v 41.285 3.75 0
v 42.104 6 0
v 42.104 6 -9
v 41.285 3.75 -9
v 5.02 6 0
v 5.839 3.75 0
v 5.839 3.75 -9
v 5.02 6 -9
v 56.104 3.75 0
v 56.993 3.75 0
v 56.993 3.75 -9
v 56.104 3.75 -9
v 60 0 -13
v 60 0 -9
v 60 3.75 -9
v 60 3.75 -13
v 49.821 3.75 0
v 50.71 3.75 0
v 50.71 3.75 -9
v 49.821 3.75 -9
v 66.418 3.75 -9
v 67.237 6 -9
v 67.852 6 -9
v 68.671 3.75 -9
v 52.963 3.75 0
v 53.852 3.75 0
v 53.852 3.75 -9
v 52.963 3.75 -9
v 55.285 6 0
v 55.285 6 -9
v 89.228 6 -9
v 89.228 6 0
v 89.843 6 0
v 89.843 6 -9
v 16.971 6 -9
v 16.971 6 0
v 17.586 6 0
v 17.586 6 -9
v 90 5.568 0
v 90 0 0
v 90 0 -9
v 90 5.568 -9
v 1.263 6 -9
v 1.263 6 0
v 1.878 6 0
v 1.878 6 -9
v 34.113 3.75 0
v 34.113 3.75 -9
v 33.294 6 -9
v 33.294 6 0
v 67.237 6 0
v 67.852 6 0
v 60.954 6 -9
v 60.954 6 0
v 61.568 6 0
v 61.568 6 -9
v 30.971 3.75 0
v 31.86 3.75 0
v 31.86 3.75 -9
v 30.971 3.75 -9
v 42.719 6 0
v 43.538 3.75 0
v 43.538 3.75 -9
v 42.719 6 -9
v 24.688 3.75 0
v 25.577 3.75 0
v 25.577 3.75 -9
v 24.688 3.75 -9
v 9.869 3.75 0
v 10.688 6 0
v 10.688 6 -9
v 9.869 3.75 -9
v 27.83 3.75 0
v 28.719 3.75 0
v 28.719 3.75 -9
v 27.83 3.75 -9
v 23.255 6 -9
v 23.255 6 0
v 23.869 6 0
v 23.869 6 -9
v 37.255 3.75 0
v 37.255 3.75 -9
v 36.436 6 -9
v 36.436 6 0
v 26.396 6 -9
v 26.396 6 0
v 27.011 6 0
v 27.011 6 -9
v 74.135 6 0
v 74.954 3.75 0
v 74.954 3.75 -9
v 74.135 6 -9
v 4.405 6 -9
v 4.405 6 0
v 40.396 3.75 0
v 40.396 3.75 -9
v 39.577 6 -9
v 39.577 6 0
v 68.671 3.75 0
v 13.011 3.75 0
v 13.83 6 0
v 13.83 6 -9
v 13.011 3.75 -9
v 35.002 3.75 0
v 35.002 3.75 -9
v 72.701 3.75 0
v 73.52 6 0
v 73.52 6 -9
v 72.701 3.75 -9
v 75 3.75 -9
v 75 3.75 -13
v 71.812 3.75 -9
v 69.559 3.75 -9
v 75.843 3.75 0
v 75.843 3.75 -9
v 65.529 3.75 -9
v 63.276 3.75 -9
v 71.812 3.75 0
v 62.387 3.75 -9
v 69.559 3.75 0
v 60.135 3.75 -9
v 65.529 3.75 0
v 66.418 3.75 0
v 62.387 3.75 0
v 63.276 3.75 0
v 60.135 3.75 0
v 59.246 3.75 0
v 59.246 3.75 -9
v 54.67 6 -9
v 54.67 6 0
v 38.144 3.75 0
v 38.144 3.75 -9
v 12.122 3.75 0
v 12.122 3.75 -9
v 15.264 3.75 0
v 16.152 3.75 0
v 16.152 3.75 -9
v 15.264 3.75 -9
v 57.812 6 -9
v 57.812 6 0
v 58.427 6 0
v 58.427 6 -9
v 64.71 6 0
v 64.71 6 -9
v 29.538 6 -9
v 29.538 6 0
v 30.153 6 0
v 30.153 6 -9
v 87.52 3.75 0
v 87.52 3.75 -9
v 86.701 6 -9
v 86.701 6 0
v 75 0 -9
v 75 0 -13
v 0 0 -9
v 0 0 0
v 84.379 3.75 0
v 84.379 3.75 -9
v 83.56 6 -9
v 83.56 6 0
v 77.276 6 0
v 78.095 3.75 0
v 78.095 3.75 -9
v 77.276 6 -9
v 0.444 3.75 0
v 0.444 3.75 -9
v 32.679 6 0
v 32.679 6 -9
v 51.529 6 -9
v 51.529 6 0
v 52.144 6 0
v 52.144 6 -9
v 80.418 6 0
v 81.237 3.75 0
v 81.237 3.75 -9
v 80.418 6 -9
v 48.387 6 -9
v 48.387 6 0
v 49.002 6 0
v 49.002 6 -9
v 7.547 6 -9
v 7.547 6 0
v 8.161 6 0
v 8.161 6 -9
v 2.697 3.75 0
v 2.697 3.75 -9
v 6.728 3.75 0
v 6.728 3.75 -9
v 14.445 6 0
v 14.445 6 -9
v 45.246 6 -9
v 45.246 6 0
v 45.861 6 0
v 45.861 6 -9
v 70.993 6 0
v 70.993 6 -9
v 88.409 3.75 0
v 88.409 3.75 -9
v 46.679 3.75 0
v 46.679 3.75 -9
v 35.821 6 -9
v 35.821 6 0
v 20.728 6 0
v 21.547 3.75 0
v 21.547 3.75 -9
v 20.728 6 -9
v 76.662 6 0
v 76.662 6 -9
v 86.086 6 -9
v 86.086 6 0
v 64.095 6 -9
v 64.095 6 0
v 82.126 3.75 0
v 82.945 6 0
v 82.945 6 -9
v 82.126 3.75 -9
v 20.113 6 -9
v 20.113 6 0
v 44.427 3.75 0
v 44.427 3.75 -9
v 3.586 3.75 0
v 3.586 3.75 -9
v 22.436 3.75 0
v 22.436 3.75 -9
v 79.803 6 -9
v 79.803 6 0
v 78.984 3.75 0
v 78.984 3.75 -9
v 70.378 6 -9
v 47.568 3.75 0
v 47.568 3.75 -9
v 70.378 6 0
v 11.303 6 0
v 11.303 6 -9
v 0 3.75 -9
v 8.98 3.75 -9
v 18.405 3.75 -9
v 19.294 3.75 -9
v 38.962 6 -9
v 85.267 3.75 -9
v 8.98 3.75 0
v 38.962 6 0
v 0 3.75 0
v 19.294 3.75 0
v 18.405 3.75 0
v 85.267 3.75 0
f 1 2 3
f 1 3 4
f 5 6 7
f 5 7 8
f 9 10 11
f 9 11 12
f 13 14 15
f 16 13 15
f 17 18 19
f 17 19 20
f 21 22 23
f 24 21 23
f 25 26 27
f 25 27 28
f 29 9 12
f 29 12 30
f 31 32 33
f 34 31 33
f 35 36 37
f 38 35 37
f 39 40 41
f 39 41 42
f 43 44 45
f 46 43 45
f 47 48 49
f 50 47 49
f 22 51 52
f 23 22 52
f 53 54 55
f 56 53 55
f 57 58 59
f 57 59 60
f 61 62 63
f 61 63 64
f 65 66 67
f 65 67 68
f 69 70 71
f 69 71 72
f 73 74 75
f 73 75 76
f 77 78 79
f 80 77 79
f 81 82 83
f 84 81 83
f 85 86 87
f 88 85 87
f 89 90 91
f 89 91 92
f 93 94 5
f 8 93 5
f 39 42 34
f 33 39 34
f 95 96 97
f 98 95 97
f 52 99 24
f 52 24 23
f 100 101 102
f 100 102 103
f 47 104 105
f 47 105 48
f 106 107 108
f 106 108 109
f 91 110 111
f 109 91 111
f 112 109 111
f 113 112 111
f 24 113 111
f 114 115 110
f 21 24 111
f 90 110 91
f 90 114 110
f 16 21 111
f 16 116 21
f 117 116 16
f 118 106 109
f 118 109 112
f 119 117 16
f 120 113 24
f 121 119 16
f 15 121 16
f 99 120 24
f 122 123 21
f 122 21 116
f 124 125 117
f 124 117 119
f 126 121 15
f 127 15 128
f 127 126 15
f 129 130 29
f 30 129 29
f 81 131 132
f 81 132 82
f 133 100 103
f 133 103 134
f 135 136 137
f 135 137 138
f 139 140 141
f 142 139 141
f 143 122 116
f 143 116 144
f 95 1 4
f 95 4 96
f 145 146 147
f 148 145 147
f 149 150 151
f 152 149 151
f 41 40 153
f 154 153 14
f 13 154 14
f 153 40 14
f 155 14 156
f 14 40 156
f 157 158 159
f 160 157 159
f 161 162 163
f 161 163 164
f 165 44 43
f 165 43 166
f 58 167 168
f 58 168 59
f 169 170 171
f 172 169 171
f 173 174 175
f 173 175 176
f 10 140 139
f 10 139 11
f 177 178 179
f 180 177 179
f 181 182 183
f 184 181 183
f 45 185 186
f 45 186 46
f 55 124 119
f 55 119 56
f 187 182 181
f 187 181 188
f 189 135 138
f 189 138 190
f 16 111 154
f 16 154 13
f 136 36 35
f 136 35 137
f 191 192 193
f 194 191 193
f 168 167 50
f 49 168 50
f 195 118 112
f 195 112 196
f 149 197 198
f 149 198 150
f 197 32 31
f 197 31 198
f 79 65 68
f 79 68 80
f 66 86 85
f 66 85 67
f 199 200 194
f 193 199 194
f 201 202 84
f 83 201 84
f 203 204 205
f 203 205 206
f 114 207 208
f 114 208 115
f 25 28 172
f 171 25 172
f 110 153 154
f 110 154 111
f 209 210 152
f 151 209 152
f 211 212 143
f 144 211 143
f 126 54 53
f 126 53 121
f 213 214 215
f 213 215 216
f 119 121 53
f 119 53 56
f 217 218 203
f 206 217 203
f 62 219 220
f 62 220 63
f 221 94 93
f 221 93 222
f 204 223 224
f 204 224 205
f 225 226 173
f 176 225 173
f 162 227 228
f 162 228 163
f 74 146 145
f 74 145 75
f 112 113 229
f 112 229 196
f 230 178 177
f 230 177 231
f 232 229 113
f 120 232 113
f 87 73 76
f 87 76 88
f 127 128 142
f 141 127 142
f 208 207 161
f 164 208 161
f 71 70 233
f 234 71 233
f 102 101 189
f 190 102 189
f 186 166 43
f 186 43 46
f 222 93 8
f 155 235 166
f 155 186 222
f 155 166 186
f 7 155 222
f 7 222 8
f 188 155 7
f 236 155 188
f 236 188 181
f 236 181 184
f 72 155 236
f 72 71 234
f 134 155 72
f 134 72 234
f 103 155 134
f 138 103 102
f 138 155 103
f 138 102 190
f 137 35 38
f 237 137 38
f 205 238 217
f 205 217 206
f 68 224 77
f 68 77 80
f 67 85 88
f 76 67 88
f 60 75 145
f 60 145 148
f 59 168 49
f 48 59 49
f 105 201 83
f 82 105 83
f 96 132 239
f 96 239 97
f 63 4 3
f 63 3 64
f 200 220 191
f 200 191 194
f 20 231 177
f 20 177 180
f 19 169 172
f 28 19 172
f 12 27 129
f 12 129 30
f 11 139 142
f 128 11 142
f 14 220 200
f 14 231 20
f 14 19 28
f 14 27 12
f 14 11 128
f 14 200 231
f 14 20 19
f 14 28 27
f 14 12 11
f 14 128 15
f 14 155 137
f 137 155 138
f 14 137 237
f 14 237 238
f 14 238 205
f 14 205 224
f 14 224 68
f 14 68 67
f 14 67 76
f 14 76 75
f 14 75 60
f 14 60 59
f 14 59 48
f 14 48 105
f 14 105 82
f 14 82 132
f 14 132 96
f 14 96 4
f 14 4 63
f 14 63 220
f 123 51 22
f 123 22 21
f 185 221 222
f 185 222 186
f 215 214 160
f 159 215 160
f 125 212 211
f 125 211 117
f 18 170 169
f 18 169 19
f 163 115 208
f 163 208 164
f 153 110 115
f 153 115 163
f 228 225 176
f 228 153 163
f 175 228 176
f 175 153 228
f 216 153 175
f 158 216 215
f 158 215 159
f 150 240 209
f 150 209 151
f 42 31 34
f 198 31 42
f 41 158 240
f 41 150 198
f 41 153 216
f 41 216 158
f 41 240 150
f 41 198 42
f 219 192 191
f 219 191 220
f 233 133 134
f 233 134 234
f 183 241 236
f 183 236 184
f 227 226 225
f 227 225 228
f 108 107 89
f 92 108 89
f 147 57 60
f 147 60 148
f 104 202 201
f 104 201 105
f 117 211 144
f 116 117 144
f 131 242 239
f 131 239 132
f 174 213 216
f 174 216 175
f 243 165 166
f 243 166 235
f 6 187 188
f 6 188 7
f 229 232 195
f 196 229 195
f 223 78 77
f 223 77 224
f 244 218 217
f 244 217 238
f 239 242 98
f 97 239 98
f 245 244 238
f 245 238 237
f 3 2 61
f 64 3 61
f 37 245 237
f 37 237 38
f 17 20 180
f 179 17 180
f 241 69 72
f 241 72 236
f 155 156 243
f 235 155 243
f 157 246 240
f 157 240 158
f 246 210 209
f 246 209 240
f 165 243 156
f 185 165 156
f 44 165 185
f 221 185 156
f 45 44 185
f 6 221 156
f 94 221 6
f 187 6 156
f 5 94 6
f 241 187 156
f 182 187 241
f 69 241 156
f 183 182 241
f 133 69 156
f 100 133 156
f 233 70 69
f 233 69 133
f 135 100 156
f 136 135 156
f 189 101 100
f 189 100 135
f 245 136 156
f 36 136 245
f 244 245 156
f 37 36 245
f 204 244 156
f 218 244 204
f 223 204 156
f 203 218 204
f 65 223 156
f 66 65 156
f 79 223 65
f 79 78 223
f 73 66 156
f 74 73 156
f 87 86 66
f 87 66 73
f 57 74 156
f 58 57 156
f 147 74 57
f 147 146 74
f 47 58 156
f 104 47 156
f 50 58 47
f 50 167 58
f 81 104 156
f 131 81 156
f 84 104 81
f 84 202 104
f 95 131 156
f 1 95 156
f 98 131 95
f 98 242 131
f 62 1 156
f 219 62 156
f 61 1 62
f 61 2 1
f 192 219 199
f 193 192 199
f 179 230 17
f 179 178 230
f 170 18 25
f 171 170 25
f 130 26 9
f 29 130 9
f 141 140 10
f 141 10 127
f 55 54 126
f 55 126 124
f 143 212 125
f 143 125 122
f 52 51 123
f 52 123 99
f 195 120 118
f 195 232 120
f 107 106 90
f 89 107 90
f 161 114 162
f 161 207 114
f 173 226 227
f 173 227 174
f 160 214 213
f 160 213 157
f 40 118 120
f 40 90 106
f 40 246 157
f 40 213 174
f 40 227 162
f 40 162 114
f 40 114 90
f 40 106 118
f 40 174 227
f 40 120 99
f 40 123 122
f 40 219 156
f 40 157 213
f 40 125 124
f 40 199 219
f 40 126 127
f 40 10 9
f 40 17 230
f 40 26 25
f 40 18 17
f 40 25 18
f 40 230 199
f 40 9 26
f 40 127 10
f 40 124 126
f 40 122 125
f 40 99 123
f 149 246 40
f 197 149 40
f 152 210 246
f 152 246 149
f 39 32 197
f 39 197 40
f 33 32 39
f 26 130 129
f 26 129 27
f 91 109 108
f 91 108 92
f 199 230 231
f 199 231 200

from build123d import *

# Parameters (mm, degrees)
BLANKSKE_W          = 90
BLANKSKE_H          = 6
BLANK_DEPTH         = 12
TOOTHCUTSIM_DEPTH   = 91.994505329
TEETHCUTS_COUNT     = 30
TEETHCUTS_PITCH     = 3.14159265
SKETCH3_W           = 91.493811728
SKETCH3_H           = 3
CUT_EXTRUDE3_DEPTH  = 10
SKETCH4_W           = 15
SKETCH4_H           = 3.75
BOSS_EXTRUDE1_DEPTH = 4


with BuildPart() as part:
    # BlankSke → Blank (new body)
    with BuildSketch(Plane.XY):
        with Locations((45, 3)):
            Rectangle(BLANKSKE_W, BLANKSKE_H)
    extrude(amount=-BLANK_DEPTH)

    # TooCutSkeSim → ToothCutSim (cut, through all)
    with BuildSketch(Plane.XY):
        Polygon((0.44443537, 3.75), (-0.44443537, 3.75), (-1.272613241, 6.0254), (1.272613241, 6.0254), align=None)
    toothcutsim = extrude(amount=-TOOTHCUTSIM_DEPTH, mode=Mode.SUBTRACT)

    # TeethCuts: ToothCutSim ×30
    with Locations(*[(i * TEETHCUTS_PITCH, 0, 0) for i in range(1, TEETHCUTS_COUNT)]):
        add(toothcutsim, mode=Mode.SUBTRACT)

    # Sketch3 → Cut-Extrude3 (cut)
    with BuildSketch(Plane(origin=(0, 0, 0), x_dir=(1, 0, 0), z_dir=(0, 1, 0))):
        with Locations((45.746905864, 10.5)):
            Rectangle(SKETCH3_W, SKETCH3_H)
    extrude(amount=CUT_EXTRUDE3_DEPTH, mode=Mode.SUBTRACT)

    # Sketch4 → Boss-Extrude1 (add)
    with BuildSketch(Plane(origin=(0, 0, -9), x_dir=(-1, 0, 0), z_dir=(0, 0, -1))):
        with Locations((-67.5, 1.875)):
            Rectangle(SKETCH4_W, SKETCH4_H)
    extrude(amount=BOSS_EXTRUDE1_DEPTH)


solid = part.part
